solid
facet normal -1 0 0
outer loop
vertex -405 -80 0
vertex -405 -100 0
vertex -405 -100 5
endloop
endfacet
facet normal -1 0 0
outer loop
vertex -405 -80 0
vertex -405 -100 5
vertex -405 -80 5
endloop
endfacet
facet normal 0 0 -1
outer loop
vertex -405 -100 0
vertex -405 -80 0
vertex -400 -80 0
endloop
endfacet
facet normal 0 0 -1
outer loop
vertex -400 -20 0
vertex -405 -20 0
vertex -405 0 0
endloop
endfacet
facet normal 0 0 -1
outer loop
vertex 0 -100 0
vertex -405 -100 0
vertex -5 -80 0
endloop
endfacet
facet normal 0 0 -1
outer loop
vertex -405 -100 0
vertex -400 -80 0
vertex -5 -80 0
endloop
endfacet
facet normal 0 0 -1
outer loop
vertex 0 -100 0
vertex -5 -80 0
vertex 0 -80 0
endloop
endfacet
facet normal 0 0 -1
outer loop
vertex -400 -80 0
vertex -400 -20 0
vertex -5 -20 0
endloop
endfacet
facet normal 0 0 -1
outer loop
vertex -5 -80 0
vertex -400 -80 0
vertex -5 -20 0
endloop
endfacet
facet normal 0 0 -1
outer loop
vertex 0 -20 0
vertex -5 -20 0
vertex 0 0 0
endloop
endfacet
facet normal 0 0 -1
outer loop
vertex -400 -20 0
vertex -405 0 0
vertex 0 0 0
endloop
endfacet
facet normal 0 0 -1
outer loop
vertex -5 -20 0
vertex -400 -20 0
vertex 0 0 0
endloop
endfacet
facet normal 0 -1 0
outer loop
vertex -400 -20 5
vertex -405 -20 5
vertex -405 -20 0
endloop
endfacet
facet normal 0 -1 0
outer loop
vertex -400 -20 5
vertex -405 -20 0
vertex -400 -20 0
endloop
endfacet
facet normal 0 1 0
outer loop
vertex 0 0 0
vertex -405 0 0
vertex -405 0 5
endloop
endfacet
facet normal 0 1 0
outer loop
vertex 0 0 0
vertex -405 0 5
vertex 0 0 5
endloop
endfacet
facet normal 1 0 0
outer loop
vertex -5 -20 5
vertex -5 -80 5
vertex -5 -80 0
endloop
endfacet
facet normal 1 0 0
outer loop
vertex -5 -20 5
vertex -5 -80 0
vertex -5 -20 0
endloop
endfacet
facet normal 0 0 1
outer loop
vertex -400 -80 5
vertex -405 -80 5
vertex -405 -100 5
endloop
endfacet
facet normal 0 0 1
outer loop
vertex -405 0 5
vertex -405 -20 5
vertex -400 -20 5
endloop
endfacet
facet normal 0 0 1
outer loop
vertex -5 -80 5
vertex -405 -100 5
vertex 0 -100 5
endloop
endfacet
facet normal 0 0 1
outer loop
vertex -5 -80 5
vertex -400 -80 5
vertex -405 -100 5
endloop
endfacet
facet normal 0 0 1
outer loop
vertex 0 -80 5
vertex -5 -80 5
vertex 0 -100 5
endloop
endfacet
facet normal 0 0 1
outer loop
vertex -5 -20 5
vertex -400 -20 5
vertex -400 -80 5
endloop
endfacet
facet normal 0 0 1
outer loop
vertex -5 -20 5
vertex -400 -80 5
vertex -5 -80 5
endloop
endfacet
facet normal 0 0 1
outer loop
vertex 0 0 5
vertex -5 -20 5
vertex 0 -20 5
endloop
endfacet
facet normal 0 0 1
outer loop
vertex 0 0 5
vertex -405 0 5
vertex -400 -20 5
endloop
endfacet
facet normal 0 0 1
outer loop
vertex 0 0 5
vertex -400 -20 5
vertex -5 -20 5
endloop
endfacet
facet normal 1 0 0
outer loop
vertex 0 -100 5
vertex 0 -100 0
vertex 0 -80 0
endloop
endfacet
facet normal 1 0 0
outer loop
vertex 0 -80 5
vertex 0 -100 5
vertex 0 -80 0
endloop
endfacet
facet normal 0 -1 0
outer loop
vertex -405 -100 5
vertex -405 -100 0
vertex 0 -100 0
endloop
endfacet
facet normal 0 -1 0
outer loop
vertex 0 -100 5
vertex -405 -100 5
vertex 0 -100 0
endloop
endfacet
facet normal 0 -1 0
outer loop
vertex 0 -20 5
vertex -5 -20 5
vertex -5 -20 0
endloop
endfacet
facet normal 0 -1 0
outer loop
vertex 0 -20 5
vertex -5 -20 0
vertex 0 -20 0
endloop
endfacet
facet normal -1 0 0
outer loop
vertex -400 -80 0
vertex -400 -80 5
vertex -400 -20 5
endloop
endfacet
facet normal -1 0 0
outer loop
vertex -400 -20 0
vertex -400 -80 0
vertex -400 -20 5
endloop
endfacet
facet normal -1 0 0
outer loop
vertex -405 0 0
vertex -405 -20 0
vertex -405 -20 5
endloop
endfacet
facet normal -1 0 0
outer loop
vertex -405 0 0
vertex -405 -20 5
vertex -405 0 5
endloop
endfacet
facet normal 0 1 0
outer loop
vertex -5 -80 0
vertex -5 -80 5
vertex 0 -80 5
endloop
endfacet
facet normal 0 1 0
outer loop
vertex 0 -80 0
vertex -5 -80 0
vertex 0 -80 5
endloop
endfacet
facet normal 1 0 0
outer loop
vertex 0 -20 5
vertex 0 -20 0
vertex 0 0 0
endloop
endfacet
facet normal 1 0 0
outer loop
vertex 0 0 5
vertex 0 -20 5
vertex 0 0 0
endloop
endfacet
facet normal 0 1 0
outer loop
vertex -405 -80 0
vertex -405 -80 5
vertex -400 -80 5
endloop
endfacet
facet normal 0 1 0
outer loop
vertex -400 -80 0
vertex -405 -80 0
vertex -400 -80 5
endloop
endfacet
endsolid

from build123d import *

# Parameters (mm, degrees)
SKETCH1_W           = 405
SKETCH1_H           = 100
BOSS_EXTRUDE1_DEPTH = 5
SKETCH2_W           = 5
SKETCH2_H           = 5
CUT_EXTRUDE1_DEPTH  = 5
BOSS_EXTRUDE2_DEPTH = 5
SKETCH6_W           = 15
SKETCH6_H           = 50
CUT_EXTRUDE4_DEPTH  = 5


with BuildPart() as part:
    # Sketch1 → Boss-Extrude1 (new body)
    with BuildSketch(Plane.XY):
        with Locations((-202.5, -50)):
            Rectangle(SKETCH1_W, SKETCH1_H)
    extrude(amount=BOSS_EXTRUDE1_DEPTH)

    # Sketch2 → Cut-Extrude1 (cut)
    with BuildSketch(Plane.XY.offset(5)):
        with Locations((-402.5, -77.5)):
            Rectangle(SKETCH2_W, SKETCH2_H)
        with Locations((-402.5, -22.5)):
            Rectangle(SKETCH2_W, SKETCH2_H)
        with Locations((-2.5, -22.5)):
            Rectangle(SKETCH2_W, SKETCH2_H)
        with Locations((-2.5, -77.5)):
            Rectangle(SKETCH2_W, SKETCH2_H)
    extrude(amount=-CUT_EXTRUDE1_DEPTH, mode=Mode.SUBTRACT)

    # Sketch3 → Boss-Extrude2 (add)
    with BuildSketch(Plane.XY.offset(5)):
        Polygon((-405, -30), (-405, -25), (-415, -25), (-415, -75), (-405, -75), (-405, -70), (-410, -70), (-410, -30), align=None)
        Polygon((0, -30), (5, -30), (5, -70), (0, -70), (0, -75), (10, -75), (10, -25), (0, -25), align=None)
    extrude(amount=-BOSS_EXTRUDE2_DEPTH)

    # Sketch6 → Cut-Extrude4 (cut)
    with BuildSketch(Plane.XY.offset(5)):
        with Locations((2.5, -50)):
            Rectangle(SKETCH6_W, SKETCH6_H)
        with Locations((-407.5, -50)):
            Rectangle(SKETCH6_W, SKETCH6_H)
    extrude(amount=-CUT_EXTRUDE4_DEPTH, mode=Mode.SUBTRACT)


solid = part.part
